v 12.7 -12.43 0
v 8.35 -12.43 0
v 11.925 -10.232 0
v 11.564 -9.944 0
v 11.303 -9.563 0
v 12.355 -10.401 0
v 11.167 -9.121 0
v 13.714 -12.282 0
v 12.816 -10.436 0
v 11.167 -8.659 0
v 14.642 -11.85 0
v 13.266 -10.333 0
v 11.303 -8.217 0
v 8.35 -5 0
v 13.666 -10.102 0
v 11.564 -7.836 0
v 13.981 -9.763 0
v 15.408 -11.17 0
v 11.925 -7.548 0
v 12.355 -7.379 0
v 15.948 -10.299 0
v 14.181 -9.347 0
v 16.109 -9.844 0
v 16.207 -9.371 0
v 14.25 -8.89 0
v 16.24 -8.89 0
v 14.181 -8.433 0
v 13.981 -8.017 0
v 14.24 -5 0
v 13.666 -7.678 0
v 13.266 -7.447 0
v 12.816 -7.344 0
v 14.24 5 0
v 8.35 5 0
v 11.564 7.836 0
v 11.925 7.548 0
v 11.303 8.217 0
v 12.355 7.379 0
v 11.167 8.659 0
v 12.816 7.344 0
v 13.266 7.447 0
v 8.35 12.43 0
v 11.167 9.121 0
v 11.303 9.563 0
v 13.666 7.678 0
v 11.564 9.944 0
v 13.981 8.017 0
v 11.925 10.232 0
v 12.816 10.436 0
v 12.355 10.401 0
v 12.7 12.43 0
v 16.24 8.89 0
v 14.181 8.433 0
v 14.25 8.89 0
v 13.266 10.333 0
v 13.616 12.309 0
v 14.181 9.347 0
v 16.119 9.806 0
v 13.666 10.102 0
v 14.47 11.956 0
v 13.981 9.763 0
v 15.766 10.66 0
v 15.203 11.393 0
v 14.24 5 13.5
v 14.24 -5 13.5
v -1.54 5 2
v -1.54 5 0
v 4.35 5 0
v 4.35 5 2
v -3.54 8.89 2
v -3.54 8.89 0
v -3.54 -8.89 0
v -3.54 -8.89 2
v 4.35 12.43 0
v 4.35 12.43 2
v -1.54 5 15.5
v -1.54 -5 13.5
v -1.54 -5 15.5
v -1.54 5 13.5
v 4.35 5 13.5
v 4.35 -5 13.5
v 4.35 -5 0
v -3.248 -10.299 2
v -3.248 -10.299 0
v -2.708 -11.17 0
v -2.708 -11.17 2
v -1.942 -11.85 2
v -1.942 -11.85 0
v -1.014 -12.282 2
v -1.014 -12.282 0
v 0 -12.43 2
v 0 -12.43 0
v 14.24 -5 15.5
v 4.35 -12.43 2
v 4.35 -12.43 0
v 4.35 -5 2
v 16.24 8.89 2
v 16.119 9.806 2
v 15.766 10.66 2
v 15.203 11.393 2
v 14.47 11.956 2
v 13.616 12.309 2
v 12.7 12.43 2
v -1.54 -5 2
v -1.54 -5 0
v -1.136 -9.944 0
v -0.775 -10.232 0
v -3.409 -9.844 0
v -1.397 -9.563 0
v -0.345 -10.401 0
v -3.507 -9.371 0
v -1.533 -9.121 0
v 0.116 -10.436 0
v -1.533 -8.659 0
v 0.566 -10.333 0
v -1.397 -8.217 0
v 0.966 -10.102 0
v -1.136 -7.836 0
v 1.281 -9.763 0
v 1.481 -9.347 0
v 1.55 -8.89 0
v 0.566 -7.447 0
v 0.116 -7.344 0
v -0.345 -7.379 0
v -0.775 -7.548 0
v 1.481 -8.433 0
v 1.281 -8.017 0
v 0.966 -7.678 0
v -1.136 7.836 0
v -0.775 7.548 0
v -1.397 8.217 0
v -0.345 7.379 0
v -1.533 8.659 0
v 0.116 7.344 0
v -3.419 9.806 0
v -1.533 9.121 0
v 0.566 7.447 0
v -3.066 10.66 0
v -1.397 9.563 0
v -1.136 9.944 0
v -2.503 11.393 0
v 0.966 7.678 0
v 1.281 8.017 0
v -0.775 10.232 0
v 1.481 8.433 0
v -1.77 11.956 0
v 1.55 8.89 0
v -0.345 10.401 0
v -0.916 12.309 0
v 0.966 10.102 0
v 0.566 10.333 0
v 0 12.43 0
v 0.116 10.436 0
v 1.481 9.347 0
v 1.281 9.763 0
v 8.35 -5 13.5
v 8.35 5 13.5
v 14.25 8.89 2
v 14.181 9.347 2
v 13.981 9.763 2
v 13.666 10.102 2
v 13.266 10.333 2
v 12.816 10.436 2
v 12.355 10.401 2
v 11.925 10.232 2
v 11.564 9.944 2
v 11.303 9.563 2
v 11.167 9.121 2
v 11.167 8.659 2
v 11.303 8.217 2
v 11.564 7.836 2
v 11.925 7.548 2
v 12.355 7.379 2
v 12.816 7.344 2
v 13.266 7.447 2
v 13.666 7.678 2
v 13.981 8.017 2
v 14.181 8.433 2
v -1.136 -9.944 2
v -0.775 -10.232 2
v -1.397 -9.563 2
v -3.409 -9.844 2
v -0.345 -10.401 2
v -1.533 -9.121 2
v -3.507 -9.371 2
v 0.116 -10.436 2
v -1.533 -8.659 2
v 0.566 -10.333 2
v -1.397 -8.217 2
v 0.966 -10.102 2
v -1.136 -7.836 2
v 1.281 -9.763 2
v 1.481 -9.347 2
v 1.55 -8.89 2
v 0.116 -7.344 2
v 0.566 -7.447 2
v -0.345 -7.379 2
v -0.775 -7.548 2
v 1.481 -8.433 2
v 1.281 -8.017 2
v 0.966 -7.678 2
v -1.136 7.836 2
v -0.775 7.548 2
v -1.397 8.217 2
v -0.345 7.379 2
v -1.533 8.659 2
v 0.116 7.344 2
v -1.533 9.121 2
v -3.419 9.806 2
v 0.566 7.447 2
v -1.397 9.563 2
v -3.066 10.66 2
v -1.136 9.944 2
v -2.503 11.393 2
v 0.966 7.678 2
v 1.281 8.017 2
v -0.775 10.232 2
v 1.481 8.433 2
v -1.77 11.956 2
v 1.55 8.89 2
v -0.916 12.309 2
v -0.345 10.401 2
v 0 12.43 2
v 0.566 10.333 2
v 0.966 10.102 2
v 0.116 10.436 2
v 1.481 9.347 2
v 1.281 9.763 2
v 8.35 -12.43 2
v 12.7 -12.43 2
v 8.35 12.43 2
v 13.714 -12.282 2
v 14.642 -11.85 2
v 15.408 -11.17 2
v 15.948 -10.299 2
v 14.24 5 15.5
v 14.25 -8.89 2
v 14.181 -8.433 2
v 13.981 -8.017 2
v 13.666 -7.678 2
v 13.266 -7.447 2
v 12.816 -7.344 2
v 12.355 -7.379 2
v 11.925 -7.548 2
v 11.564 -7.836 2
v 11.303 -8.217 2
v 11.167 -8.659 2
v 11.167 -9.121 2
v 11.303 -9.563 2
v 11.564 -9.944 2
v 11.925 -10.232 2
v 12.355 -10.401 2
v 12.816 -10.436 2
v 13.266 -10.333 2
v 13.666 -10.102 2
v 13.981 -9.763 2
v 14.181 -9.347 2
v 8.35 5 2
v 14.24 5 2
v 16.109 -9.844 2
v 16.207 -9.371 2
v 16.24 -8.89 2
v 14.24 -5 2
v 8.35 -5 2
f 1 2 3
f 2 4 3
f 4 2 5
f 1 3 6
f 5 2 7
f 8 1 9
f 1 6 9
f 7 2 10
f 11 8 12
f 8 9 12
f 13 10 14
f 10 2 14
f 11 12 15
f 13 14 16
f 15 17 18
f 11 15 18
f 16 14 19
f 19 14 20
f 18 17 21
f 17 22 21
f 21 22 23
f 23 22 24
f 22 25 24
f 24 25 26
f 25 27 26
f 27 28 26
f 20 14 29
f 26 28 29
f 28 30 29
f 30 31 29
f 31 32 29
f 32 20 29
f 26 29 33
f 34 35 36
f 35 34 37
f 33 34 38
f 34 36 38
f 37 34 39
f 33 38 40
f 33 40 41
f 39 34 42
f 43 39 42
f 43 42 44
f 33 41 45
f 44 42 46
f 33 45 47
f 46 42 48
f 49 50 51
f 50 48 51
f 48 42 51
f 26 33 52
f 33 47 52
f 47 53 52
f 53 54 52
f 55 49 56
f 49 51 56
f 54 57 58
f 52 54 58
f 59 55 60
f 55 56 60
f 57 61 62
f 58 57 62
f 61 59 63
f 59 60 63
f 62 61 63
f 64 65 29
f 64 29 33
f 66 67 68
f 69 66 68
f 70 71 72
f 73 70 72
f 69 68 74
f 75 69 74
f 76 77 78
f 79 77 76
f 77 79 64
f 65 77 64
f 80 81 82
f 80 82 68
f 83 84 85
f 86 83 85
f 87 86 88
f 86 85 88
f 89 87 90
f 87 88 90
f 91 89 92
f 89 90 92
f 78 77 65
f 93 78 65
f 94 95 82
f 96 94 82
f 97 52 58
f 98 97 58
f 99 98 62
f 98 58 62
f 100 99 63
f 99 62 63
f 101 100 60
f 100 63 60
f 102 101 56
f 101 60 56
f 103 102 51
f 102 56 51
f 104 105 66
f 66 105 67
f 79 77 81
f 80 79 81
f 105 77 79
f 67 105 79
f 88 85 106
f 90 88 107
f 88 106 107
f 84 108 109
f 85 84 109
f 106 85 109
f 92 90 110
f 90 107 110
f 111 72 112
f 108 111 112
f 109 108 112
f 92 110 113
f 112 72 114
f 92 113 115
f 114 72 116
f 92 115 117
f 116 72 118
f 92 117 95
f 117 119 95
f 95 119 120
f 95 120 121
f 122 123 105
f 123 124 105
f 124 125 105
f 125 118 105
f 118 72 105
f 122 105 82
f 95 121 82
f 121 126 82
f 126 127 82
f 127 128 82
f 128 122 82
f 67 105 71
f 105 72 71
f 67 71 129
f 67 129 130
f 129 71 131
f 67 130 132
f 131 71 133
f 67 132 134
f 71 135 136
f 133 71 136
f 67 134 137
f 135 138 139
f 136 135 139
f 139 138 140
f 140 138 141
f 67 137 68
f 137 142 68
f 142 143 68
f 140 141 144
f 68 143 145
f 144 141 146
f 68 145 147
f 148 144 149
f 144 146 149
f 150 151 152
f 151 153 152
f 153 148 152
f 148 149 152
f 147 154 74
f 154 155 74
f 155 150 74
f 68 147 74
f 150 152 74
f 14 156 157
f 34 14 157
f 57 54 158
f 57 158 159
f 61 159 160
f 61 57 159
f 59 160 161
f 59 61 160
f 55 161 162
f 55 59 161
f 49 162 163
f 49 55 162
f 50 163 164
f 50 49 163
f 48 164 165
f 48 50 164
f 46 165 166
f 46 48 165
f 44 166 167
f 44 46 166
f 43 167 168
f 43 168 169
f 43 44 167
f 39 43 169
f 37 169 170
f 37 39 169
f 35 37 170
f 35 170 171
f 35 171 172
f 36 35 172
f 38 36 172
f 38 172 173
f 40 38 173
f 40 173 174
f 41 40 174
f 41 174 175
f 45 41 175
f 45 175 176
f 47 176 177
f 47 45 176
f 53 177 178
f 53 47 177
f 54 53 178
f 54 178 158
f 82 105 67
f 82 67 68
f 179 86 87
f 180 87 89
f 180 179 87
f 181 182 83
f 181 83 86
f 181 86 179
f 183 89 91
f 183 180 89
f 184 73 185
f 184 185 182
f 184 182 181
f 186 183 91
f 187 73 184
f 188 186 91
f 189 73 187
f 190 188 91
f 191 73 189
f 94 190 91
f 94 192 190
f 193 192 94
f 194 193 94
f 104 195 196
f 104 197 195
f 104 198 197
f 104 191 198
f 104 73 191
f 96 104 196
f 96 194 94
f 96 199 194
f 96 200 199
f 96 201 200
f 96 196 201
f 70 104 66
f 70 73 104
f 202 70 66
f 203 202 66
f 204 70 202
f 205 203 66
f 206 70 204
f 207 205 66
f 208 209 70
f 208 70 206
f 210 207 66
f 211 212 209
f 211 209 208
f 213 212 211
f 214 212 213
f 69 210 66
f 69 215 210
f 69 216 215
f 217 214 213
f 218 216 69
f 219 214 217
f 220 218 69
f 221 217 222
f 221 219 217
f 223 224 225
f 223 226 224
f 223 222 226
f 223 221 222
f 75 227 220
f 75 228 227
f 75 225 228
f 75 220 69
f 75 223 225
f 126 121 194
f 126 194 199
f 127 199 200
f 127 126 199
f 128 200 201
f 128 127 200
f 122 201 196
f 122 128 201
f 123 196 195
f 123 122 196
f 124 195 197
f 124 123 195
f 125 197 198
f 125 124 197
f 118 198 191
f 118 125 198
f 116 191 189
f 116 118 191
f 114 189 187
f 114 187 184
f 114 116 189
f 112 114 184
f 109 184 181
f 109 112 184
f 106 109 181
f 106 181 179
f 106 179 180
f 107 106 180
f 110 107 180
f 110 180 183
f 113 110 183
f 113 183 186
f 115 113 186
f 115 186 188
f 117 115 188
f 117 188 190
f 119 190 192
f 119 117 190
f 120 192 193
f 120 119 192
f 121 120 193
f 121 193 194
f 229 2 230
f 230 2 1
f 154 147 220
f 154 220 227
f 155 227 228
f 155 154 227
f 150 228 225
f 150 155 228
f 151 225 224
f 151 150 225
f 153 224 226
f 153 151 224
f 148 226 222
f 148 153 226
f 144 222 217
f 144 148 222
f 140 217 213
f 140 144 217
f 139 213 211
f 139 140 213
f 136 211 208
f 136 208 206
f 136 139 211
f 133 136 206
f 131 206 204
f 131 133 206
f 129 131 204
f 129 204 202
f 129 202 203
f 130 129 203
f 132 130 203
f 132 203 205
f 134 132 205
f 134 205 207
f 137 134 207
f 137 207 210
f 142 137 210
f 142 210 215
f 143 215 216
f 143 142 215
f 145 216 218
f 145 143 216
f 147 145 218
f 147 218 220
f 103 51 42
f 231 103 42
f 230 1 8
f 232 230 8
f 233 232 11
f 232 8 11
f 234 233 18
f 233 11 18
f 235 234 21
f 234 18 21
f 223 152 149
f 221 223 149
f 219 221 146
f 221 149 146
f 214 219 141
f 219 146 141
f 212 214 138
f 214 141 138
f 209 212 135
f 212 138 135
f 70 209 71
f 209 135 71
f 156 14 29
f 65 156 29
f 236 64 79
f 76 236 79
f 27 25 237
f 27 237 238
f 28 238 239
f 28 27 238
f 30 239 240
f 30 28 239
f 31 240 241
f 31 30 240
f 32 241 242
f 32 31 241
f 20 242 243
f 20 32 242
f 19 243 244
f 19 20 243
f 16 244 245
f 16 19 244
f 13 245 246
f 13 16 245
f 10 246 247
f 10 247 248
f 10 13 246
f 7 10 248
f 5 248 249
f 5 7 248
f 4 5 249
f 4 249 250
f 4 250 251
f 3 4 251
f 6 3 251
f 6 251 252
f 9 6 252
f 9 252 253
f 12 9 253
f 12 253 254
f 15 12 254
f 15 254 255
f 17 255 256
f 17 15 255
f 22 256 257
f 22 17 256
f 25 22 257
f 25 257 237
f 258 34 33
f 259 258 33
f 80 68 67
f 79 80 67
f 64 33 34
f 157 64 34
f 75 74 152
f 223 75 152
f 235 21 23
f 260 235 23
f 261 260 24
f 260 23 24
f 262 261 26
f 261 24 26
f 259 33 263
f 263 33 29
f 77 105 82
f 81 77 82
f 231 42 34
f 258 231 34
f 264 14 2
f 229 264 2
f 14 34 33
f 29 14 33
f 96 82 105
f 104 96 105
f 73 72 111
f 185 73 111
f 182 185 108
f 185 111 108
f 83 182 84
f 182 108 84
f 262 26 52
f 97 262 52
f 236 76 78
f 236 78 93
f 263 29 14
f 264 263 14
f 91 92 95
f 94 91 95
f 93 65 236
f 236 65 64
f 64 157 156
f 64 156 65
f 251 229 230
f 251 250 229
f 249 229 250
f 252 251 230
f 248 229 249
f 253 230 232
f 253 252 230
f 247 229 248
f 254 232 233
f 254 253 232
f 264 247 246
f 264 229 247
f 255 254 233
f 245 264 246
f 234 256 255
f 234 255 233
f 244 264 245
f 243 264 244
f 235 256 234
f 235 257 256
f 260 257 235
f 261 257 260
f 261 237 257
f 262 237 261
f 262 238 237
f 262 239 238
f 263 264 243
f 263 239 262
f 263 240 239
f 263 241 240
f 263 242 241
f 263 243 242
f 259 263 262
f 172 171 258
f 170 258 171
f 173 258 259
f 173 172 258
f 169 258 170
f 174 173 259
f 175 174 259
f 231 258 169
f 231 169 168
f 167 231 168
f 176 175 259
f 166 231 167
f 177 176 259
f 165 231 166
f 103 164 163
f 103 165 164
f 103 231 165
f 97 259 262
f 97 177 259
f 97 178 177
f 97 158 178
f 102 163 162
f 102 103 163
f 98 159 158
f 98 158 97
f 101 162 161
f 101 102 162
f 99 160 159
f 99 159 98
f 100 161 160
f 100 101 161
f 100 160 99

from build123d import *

# Parameters (mm, degrees)
F0_R     = 1.55
F1_DEPTH = 2
F0_W     = 5.08
F0_H     = 10
F0_W_2   = 0.81
F2_DEPTH = 13.5
F3_START = 13.5
F0_W_3   = 4
F3_DEPTH = 2


with BuildPart() as f1:
    # F0 (on Top) → F1 (new body)
    with BuildSketch(Plane.XY):
        with BuildLine():
            ThreePointArc((0, -12.43), (2.5031580054, -11.3931580054), (3.54, -8.89))
            Line((3.54, -8.89), (3.54, -5))
            Line((3.54, -5), (-1.54, -5))
            Line((-1.54, -5), (-1.54, 5))
            Line((-1.54, 5), (3.54, 5))
            Line((3.54, 5), (3.54, 8.89))
            ThreePointArc((3.54, 8.89), (2.5031580054, 11.3931580054), (0, 12.43))
            ThreePointArc((0, 12.43), (-2.5031580054, 11.3931580054), (-3.54, 8.89))
            Line((-3.54, 8.89), (-3.54, -8.89))
            ThreePointArc((-3.54, -8.89), (-3.4661424948, -9.6093442887), (-3.2476518612, -10.2986722077))
            ThreePointArc((-3.2476518612, -10.2986722077), (-1.9422796381, -11.8495860872), (0, -12.43))
        make_face()
        with Locations((0, -8.89)):
            Circle(F0_R, mode=Mode.SUBTRACT)
        with Locations((0, 8.89)):
            Circle(F0_R, mode=Mode.SUBTRACT)
        with BuildLine():
            Line((3.54, 8.89), (3.54, 5))
            Line((3.54, 5), (4.35, 5))
            Line((4.35, 5), (4.35, 12.43))
            Line((4.35, 12.43), (0, 12.43))
            ThreePointArc((0, 12.43), (2.5031580054, 11.3931580054), (3.54, 8.89))
        make_face()
        with BuildLine():
            Line((3.54, -5), (3.54, -8.89))
            ThreePointArc((3.54, -8.89), (2.5031580054, -11.3931580054), (0, -12.43))
            Line((0, -12.43), (4.35, -12.43))
            Line((4.35, -12.43), (4.35, -5))
            Line((4.35, -5), (3.54, -5))
        make_face()
    extrude(amount=F1_DEPTH)


with BuildPart() as f1b:
    # F0 (on Top) → F1, piece 2 (new body)
    with BuildSketch(Plane.XY):
        with BuildLine():
            Line((9.16, -5), (8.35, -5))
            Line((8.35, -5), (8.35, -12.43))
            Line((8.35, -12.43), (12.7, -12.43))
            ThreePointArc((12.7, -12.43), (10.1968419946, -11.3931580054), (9.16, -8.89))
            Line((9.16, -8.89), (9.16, -5))
        make_face()
        with BuildLine():
            Line((14.24, -5), (9.16, -5))
            Line((9.16, -5), (9.16, -8.89))
            ThreePointArc((9.16, -8.89), (10.1968419946, -11.3931580054), (12.7, -12.43))
            ThreePointArc((12.7, -12.43), (14.6422796381, -11.8495860872), (15.9476518612, -10.2986722077))
            ThreePointArc((15.9476518612, -10.2986722077), (16.1661424948, -9.6093442887), (16.24, -8.89))
            Line((16.24, -8.89), (16.24, 8.89))
            ThreePointArc((16.24, 8.89), (15.2031580054, 11.3931580054), (12.7, 12.43))
            ThreePointArc((12.7, 12.43), (10.1968419946, 11.3931580054), (9.16, 8.89))
            Line((9.16, 8.89), (9.16, 5))
            Line((9.16, 5), (14.24, 5))
            Line((14.24, 5), (14.24, -5))
        make_face()
        with Locations((12.7, -8.89)):
            Circle(F0_R, mode=Mode.SUBTRACT)
        with Locations((12.7, 8.89)):
            Circle(F0_R, mode=Mode.SUBTRACT)
        with BuildLine():
            Line((8.35, 12.43), (8.35, 5))
            Line((8.35, 5), (9.16, 5))
            Line((9.16, 5), (9.16, 8.89))
            ThreePointArc((9.16, 8.89), (10.1968419946, 11.3931580054), (12.7, 12.43))
            Line((12.7, 12.43), (8.35, 12.43))
        make_face()
    extrude(amount=F1_DEPTH)


with BuildPart() as f2:
    # F0 (on Top) → F2 (new body)
    with BuildSketch(Plane.XY):
        with Locations((1, 0)):
            Rectangle(F0_W, F0_H)
        with Locations((3.945, 0)):
            Rectangle(F0_W_2, F0_H)
    extrude(amount=F2_DEPTH)


with BuildPart() as f2b:
    # F0 (on Top) → F2, piece 2 (new body)
    with BuildSketch(Plane.XY):
        with Locations((11.7, 0)):
            Rectangle(F0_W, F0_H)
        with Locations((8.755, 0)):
            Rectangle(F0_W_2, F0_H)
    extrude(amount=F2_DEPTH)


with BuildPart() as f3:
    # F0 (on Top) → F3 (new body)
    with BuildSketch(Plane.XY.offset(F3_START)):
        with Locations((11.7, 0)):
            Rectangle(F0_W, F0_H)
        with Locations((6.35, 0)):
            Rectangle(F0_W_3, F0_H)
        with Locations((1, 0)):
            Rectangle(F0_W, F0_H)
        with Locations((3.945, 0)):
            Rectangle(F0_W_2, F0_H)
        with Locations((8.755, 0)):
            Rectangle(F0_W_2, F0_H)
    extrude(amount=F3_DEPTH)


solid = Compound([f1.part, f1b.part, f2.part, f2b.part, f3.part])
